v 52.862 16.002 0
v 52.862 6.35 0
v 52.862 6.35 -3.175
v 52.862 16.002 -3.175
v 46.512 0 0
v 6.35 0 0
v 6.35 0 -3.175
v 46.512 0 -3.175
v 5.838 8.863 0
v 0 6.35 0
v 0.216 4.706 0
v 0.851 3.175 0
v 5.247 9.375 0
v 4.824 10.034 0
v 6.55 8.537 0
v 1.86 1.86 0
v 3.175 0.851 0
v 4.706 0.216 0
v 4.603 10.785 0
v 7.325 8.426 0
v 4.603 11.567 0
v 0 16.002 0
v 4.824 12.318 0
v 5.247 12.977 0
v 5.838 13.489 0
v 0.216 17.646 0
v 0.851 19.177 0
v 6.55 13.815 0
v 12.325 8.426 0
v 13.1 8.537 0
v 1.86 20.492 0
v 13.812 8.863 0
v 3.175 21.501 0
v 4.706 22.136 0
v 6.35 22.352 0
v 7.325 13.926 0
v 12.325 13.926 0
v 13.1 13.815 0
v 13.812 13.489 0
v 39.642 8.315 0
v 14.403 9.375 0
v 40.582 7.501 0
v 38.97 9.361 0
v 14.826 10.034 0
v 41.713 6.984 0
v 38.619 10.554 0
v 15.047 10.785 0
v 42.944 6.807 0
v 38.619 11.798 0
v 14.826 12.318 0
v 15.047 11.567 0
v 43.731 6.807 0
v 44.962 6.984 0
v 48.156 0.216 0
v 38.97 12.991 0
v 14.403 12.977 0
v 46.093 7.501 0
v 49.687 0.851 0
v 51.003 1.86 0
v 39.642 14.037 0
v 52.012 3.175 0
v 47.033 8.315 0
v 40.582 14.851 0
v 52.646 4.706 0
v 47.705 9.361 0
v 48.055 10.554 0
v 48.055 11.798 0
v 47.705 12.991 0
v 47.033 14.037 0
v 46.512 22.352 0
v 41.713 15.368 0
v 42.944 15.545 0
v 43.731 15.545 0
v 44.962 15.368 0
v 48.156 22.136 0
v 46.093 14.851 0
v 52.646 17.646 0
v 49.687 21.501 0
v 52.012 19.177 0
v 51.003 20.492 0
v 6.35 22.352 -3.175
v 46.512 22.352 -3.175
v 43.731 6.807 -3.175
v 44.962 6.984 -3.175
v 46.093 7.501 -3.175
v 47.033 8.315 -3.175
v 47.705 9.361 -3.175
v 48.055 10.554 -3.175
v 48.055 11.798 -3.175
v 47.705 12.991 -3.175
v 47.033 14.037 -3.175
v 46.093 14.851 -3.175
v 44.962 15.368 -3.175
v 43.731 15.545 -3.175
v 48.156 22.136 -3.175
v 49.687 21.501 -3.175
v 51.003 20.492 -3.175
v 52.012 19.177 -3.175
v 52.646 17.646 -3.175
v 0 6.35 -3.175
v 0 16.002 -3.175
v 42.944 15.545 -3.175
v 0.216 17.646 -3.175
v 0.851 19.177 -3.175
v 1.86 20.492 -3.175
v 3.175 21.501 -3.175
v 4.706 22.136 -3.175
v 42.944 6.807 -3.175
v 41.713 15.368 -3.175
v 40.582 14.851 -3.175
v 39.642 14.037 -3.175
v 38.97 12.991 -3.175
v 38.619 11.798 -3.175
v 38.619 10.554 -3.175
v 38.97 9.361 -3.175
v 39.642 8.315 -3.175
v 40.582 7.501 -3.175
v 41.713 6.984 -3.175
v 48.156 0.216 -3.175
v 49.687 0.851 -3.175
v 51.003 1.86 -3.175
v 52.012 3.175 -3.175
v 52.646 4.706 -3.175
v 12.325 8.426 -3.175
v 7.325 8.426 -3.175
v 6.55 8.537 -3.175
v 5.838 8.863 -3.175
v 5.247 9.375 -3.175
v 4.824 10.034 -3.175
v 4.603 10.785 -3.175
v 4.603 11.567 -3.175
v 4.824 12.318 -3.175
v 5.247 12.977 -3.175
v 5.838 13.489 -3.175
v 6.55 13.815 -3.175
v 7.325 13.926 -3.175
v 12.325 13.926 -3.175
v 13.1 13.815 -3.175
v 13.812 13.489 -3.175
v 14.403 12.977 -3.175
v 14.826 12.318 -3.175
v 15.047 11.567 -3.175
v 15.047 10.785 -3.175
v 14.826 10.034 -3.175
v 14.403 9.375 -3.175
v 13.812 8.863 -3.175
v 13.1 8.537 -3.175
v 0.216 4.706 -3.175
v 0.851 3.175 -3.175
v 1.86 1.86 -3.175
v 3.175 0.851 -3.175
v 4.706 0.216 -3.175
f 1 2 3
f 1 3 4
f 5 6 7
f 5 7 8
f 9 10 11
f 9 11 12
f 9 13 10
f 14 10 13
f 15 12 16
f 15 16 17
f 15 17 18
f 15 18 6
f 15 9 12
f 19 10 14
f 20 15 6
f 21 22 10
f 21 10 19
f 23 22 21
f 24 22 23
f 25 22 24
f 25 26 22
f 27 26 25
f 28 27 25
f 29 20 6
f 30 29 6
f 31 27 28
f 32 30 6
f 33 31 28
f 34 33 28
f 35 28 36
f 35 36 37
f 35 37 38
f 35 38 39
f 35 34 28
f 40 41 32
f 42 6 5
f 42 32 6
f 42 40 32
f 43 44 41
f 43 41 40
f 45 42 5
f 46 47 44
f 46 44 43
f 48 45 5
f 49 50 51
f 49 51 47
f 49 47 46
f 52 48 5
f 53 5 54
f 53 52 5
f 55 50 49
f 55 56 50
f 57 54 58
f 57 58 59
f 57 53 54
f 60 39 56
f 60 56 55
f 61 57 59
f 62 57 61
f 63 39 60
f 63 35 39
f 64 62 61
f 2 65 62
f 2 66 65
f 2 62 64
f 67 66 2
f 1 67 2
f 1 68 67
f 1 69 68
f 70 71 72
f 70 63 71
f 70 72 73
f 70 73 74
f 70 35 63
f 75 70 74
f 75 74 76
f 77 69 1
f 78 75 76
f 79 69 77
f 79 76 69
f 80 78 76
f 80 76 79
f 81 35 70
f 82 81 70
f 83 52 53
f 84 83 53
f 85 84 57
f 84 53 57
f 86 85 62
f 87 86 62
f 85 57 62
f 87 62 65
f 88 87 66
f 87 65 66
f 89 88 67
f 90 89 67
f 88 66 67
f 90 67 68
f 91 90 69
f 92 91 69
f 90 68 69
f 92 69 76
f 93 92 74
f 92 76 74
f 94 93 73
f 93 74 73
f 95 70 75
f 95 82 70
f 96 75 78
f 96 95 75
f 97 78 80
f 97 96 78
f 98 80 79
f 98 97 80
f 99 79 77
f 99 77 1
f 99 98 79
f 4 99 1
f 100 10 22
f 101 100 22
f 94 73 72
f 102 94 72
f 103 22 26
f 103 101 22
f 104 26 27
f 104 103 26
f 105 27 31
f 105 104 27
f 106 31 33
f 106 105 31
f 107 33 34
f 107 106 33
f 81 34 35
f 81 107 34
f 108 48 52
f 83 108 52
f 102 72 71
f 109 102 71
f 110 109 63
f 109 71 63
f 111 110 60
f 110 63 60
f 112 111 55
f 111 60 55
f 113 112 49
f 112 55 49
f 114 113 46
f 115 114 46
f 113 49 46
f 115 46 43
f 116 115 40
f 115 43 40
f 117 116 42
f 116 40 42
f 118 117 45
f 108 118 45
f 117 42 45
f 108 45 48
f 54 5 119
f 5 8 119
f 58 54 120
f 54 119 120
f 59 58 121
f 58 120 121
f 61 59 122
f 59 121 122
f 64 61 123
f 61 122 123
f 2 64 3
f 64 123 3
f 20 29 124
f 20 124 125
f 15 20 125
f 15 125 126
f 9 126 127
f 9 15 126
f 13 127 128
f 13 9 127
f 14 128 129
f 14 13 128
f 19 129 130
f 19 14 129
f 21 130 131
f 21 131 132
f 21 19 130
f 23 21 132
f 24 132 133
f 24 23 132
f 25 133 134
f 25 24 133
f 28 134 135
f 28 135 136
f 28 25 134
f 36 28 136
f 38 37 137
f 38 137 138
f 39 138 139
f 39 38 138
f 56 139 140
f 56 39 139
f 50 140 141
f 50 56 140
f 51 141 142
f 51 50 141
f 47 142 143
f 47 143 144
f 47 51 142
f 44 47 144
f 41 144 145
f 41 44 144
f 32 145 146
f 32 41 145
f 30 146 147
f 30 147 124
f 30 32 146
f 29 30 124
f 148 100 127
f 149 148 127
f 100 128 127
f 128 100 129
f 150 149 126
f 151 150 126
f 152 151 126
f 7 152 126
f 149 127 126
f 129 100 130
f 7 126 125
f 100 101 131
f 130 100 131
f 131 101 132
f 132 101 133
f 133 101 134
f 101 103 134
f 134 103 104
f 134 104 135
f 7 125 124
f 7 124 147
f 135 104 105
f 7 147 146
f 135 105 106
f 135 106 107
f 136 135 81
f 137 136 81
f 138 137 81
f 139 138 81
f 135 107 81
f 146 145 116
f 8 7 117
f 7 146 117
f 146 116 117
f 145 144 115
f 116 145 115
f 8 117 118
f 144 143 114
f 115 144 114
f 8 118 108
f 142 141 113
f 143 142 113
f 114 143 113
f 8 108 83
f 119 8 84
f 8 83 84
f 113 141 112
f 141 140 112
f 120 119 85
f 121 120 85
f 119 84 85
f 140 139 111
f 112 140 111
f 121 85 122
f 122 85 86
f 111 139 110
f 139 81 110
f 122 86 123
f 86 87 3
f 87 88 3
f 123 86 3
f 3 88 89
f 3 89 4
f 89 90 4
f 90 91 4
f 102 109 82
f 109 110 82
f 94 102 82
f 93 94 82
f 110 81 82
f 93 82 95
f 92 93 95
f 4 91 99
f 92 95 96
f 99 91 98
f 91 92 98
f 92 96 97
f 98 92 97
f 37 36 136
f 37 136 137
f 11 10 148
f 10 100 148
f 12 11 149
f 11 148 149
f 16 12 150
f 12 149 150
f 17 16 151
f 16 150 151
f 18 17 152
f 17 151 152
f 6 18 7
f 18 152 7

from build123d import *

# Parameters (mm, degrees)
SKETCH1_W          = 52.8624
SKETCH1_H          = 22.352
BASE_FLANGE1_DEPTH = 3.175
CUT_EXTRUDE1_DEPTH = 3.175
FILLET1_R          = 6.35


# Sheet-metal steps are written as plain solids
with BuildPart() as part:
    # Sketch1 → Base-Flange1 (new body)
    with BuildSketch(Plane.XY):
        with Locations((26.4312, 11.176)):
            Rectangle(SKETCH1_W, SKETCH1_H)
    extrude(amount=-BASE_FLANGE1_DEPTH)

    # Sketch6 → Cut-Extrude1 (cut)
    with BuildSketch(Plane.XY):
        with BuildLine():
            Line((7.325, 13.926), (12.325, 13.926))
            ThreePointArc((12.325, 13.926), (15.075, 11.176), (12.325, 8.426))
            Line((12.325, 8.426), (7.325, 8.426))
            ThreePointArc((7.325, 8.426), (4.575, 11.176), (7.325, 13.926))
        make_face()
        with BuildLine():
            Line((42.9437, 6.8072), (43.7311, 6.8072))
            ThreePointArc((43.7311, 6.8072), (48.0999, 11.176), (43.7311, 15.5448))
            Line((43.7311, 15.5448), (42.9437, 15.5448))
            ThreePointArc((42.9437, 15.5448), (38.5749, 11.176), (42.9437, 6.8072))
        make_face()
    extrude(amount=-CUT_EXTRUDE1_DEPTH, mode=Mode.SUBTRACT)

    # Fillet1
    fillet1_edges = [part.edges().sort_by_distance(p)[0] for p in [
        (0, 22.352, -1.5875),
        (52.8624, 22.352, -1.5875),
        (52.8624, 0, -1.5875),
        (0, 0, -1.5875),
    ]]
    fillet(fillet1_edges, radius=FILLET1_R)


solid = part.part
